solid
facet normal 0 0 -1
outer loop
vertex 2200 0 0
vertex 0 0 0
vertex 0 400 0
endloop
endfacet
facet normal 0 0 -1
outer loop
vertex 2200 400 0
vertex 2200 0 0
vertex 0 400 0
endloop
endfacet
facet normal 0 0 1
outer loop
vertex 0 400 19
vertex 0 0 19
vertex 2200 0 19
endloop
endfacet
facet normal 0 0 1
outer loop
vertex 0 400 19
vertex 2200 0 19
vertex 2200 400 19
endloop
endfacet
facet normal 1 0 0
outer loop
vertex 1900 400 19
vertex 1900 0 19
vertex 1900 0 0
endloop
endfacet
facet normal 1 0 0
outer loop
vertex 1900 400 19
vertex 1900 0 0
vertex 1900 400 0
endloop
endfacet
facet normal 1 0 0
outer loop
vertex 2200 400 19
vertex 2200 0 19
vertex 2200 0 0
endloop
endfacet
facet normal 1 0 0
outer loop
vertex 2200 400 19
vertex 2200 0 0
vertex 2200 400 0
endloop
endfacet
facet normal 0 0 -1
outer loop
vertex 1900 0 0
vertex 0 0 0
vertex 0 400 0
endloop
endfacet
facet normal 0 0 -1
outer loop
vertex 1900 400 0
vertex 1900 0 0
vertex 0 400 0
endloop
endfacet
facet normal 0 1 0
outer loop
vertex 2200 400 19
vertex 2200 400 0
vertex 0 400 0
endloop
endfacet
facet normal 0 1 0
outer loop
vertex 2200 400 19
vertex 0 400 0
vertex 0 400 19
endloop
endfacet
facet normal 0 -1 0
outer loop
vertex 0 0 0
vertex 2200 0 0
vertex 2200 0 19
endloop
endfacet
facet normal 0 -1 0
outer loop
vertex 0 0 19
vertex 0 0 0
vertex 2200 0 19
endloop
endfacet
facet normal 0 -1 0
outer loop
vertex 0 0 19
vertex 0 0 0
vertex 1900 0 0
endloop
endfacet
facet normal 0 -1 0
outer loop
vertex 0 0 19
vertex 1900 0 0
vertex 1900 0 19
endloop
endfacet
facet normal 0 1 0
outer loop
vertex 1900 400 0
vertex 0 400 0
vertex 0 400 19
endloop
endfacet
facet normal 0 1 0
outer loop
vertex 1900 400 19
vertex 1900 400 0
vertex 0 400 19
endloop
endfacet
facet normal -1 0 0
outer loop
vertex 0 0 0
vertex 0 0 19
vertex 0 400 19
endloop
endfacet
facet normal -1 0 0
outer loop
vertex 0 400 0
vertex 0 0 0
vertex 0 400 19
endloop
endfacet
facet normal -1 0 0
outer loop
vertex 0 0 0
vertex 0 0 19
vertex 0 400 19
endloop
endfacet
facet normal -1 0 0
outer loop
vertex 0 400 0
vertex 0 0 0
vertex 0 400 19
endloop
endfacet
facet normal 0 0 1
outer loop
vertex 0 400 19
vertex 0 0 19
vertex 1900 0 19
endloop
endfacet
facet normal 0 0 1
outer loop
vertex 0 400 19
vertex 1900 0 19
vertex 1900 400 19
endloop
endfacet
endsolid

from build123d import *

# Parameters (mm, degrees)
F0_W     = 400
F0_H     = 19
F1_DEPTH = 2200
F2_DEPTH = 1900


with BuildPart() as f1:
    # F0 (on Right) → F1 (new body)
    with BuildSketch(Plane.YZ):
        with Locations((200, 9.5)):
            Rectangle(F0_W, F0_H)
    extrude(amount=F1_DEPTH)


with BuildPart() as f2:
    # F0 (on Right) → F2 (new body)
    with BuildSketch(Plane.YZ):
        with Locations((200, 9.5)):
            Rectangle(F0_W, F0_H)
    extrude(amount=F2_DEPTH)


solid = Compound([f1.part, f2.part])
